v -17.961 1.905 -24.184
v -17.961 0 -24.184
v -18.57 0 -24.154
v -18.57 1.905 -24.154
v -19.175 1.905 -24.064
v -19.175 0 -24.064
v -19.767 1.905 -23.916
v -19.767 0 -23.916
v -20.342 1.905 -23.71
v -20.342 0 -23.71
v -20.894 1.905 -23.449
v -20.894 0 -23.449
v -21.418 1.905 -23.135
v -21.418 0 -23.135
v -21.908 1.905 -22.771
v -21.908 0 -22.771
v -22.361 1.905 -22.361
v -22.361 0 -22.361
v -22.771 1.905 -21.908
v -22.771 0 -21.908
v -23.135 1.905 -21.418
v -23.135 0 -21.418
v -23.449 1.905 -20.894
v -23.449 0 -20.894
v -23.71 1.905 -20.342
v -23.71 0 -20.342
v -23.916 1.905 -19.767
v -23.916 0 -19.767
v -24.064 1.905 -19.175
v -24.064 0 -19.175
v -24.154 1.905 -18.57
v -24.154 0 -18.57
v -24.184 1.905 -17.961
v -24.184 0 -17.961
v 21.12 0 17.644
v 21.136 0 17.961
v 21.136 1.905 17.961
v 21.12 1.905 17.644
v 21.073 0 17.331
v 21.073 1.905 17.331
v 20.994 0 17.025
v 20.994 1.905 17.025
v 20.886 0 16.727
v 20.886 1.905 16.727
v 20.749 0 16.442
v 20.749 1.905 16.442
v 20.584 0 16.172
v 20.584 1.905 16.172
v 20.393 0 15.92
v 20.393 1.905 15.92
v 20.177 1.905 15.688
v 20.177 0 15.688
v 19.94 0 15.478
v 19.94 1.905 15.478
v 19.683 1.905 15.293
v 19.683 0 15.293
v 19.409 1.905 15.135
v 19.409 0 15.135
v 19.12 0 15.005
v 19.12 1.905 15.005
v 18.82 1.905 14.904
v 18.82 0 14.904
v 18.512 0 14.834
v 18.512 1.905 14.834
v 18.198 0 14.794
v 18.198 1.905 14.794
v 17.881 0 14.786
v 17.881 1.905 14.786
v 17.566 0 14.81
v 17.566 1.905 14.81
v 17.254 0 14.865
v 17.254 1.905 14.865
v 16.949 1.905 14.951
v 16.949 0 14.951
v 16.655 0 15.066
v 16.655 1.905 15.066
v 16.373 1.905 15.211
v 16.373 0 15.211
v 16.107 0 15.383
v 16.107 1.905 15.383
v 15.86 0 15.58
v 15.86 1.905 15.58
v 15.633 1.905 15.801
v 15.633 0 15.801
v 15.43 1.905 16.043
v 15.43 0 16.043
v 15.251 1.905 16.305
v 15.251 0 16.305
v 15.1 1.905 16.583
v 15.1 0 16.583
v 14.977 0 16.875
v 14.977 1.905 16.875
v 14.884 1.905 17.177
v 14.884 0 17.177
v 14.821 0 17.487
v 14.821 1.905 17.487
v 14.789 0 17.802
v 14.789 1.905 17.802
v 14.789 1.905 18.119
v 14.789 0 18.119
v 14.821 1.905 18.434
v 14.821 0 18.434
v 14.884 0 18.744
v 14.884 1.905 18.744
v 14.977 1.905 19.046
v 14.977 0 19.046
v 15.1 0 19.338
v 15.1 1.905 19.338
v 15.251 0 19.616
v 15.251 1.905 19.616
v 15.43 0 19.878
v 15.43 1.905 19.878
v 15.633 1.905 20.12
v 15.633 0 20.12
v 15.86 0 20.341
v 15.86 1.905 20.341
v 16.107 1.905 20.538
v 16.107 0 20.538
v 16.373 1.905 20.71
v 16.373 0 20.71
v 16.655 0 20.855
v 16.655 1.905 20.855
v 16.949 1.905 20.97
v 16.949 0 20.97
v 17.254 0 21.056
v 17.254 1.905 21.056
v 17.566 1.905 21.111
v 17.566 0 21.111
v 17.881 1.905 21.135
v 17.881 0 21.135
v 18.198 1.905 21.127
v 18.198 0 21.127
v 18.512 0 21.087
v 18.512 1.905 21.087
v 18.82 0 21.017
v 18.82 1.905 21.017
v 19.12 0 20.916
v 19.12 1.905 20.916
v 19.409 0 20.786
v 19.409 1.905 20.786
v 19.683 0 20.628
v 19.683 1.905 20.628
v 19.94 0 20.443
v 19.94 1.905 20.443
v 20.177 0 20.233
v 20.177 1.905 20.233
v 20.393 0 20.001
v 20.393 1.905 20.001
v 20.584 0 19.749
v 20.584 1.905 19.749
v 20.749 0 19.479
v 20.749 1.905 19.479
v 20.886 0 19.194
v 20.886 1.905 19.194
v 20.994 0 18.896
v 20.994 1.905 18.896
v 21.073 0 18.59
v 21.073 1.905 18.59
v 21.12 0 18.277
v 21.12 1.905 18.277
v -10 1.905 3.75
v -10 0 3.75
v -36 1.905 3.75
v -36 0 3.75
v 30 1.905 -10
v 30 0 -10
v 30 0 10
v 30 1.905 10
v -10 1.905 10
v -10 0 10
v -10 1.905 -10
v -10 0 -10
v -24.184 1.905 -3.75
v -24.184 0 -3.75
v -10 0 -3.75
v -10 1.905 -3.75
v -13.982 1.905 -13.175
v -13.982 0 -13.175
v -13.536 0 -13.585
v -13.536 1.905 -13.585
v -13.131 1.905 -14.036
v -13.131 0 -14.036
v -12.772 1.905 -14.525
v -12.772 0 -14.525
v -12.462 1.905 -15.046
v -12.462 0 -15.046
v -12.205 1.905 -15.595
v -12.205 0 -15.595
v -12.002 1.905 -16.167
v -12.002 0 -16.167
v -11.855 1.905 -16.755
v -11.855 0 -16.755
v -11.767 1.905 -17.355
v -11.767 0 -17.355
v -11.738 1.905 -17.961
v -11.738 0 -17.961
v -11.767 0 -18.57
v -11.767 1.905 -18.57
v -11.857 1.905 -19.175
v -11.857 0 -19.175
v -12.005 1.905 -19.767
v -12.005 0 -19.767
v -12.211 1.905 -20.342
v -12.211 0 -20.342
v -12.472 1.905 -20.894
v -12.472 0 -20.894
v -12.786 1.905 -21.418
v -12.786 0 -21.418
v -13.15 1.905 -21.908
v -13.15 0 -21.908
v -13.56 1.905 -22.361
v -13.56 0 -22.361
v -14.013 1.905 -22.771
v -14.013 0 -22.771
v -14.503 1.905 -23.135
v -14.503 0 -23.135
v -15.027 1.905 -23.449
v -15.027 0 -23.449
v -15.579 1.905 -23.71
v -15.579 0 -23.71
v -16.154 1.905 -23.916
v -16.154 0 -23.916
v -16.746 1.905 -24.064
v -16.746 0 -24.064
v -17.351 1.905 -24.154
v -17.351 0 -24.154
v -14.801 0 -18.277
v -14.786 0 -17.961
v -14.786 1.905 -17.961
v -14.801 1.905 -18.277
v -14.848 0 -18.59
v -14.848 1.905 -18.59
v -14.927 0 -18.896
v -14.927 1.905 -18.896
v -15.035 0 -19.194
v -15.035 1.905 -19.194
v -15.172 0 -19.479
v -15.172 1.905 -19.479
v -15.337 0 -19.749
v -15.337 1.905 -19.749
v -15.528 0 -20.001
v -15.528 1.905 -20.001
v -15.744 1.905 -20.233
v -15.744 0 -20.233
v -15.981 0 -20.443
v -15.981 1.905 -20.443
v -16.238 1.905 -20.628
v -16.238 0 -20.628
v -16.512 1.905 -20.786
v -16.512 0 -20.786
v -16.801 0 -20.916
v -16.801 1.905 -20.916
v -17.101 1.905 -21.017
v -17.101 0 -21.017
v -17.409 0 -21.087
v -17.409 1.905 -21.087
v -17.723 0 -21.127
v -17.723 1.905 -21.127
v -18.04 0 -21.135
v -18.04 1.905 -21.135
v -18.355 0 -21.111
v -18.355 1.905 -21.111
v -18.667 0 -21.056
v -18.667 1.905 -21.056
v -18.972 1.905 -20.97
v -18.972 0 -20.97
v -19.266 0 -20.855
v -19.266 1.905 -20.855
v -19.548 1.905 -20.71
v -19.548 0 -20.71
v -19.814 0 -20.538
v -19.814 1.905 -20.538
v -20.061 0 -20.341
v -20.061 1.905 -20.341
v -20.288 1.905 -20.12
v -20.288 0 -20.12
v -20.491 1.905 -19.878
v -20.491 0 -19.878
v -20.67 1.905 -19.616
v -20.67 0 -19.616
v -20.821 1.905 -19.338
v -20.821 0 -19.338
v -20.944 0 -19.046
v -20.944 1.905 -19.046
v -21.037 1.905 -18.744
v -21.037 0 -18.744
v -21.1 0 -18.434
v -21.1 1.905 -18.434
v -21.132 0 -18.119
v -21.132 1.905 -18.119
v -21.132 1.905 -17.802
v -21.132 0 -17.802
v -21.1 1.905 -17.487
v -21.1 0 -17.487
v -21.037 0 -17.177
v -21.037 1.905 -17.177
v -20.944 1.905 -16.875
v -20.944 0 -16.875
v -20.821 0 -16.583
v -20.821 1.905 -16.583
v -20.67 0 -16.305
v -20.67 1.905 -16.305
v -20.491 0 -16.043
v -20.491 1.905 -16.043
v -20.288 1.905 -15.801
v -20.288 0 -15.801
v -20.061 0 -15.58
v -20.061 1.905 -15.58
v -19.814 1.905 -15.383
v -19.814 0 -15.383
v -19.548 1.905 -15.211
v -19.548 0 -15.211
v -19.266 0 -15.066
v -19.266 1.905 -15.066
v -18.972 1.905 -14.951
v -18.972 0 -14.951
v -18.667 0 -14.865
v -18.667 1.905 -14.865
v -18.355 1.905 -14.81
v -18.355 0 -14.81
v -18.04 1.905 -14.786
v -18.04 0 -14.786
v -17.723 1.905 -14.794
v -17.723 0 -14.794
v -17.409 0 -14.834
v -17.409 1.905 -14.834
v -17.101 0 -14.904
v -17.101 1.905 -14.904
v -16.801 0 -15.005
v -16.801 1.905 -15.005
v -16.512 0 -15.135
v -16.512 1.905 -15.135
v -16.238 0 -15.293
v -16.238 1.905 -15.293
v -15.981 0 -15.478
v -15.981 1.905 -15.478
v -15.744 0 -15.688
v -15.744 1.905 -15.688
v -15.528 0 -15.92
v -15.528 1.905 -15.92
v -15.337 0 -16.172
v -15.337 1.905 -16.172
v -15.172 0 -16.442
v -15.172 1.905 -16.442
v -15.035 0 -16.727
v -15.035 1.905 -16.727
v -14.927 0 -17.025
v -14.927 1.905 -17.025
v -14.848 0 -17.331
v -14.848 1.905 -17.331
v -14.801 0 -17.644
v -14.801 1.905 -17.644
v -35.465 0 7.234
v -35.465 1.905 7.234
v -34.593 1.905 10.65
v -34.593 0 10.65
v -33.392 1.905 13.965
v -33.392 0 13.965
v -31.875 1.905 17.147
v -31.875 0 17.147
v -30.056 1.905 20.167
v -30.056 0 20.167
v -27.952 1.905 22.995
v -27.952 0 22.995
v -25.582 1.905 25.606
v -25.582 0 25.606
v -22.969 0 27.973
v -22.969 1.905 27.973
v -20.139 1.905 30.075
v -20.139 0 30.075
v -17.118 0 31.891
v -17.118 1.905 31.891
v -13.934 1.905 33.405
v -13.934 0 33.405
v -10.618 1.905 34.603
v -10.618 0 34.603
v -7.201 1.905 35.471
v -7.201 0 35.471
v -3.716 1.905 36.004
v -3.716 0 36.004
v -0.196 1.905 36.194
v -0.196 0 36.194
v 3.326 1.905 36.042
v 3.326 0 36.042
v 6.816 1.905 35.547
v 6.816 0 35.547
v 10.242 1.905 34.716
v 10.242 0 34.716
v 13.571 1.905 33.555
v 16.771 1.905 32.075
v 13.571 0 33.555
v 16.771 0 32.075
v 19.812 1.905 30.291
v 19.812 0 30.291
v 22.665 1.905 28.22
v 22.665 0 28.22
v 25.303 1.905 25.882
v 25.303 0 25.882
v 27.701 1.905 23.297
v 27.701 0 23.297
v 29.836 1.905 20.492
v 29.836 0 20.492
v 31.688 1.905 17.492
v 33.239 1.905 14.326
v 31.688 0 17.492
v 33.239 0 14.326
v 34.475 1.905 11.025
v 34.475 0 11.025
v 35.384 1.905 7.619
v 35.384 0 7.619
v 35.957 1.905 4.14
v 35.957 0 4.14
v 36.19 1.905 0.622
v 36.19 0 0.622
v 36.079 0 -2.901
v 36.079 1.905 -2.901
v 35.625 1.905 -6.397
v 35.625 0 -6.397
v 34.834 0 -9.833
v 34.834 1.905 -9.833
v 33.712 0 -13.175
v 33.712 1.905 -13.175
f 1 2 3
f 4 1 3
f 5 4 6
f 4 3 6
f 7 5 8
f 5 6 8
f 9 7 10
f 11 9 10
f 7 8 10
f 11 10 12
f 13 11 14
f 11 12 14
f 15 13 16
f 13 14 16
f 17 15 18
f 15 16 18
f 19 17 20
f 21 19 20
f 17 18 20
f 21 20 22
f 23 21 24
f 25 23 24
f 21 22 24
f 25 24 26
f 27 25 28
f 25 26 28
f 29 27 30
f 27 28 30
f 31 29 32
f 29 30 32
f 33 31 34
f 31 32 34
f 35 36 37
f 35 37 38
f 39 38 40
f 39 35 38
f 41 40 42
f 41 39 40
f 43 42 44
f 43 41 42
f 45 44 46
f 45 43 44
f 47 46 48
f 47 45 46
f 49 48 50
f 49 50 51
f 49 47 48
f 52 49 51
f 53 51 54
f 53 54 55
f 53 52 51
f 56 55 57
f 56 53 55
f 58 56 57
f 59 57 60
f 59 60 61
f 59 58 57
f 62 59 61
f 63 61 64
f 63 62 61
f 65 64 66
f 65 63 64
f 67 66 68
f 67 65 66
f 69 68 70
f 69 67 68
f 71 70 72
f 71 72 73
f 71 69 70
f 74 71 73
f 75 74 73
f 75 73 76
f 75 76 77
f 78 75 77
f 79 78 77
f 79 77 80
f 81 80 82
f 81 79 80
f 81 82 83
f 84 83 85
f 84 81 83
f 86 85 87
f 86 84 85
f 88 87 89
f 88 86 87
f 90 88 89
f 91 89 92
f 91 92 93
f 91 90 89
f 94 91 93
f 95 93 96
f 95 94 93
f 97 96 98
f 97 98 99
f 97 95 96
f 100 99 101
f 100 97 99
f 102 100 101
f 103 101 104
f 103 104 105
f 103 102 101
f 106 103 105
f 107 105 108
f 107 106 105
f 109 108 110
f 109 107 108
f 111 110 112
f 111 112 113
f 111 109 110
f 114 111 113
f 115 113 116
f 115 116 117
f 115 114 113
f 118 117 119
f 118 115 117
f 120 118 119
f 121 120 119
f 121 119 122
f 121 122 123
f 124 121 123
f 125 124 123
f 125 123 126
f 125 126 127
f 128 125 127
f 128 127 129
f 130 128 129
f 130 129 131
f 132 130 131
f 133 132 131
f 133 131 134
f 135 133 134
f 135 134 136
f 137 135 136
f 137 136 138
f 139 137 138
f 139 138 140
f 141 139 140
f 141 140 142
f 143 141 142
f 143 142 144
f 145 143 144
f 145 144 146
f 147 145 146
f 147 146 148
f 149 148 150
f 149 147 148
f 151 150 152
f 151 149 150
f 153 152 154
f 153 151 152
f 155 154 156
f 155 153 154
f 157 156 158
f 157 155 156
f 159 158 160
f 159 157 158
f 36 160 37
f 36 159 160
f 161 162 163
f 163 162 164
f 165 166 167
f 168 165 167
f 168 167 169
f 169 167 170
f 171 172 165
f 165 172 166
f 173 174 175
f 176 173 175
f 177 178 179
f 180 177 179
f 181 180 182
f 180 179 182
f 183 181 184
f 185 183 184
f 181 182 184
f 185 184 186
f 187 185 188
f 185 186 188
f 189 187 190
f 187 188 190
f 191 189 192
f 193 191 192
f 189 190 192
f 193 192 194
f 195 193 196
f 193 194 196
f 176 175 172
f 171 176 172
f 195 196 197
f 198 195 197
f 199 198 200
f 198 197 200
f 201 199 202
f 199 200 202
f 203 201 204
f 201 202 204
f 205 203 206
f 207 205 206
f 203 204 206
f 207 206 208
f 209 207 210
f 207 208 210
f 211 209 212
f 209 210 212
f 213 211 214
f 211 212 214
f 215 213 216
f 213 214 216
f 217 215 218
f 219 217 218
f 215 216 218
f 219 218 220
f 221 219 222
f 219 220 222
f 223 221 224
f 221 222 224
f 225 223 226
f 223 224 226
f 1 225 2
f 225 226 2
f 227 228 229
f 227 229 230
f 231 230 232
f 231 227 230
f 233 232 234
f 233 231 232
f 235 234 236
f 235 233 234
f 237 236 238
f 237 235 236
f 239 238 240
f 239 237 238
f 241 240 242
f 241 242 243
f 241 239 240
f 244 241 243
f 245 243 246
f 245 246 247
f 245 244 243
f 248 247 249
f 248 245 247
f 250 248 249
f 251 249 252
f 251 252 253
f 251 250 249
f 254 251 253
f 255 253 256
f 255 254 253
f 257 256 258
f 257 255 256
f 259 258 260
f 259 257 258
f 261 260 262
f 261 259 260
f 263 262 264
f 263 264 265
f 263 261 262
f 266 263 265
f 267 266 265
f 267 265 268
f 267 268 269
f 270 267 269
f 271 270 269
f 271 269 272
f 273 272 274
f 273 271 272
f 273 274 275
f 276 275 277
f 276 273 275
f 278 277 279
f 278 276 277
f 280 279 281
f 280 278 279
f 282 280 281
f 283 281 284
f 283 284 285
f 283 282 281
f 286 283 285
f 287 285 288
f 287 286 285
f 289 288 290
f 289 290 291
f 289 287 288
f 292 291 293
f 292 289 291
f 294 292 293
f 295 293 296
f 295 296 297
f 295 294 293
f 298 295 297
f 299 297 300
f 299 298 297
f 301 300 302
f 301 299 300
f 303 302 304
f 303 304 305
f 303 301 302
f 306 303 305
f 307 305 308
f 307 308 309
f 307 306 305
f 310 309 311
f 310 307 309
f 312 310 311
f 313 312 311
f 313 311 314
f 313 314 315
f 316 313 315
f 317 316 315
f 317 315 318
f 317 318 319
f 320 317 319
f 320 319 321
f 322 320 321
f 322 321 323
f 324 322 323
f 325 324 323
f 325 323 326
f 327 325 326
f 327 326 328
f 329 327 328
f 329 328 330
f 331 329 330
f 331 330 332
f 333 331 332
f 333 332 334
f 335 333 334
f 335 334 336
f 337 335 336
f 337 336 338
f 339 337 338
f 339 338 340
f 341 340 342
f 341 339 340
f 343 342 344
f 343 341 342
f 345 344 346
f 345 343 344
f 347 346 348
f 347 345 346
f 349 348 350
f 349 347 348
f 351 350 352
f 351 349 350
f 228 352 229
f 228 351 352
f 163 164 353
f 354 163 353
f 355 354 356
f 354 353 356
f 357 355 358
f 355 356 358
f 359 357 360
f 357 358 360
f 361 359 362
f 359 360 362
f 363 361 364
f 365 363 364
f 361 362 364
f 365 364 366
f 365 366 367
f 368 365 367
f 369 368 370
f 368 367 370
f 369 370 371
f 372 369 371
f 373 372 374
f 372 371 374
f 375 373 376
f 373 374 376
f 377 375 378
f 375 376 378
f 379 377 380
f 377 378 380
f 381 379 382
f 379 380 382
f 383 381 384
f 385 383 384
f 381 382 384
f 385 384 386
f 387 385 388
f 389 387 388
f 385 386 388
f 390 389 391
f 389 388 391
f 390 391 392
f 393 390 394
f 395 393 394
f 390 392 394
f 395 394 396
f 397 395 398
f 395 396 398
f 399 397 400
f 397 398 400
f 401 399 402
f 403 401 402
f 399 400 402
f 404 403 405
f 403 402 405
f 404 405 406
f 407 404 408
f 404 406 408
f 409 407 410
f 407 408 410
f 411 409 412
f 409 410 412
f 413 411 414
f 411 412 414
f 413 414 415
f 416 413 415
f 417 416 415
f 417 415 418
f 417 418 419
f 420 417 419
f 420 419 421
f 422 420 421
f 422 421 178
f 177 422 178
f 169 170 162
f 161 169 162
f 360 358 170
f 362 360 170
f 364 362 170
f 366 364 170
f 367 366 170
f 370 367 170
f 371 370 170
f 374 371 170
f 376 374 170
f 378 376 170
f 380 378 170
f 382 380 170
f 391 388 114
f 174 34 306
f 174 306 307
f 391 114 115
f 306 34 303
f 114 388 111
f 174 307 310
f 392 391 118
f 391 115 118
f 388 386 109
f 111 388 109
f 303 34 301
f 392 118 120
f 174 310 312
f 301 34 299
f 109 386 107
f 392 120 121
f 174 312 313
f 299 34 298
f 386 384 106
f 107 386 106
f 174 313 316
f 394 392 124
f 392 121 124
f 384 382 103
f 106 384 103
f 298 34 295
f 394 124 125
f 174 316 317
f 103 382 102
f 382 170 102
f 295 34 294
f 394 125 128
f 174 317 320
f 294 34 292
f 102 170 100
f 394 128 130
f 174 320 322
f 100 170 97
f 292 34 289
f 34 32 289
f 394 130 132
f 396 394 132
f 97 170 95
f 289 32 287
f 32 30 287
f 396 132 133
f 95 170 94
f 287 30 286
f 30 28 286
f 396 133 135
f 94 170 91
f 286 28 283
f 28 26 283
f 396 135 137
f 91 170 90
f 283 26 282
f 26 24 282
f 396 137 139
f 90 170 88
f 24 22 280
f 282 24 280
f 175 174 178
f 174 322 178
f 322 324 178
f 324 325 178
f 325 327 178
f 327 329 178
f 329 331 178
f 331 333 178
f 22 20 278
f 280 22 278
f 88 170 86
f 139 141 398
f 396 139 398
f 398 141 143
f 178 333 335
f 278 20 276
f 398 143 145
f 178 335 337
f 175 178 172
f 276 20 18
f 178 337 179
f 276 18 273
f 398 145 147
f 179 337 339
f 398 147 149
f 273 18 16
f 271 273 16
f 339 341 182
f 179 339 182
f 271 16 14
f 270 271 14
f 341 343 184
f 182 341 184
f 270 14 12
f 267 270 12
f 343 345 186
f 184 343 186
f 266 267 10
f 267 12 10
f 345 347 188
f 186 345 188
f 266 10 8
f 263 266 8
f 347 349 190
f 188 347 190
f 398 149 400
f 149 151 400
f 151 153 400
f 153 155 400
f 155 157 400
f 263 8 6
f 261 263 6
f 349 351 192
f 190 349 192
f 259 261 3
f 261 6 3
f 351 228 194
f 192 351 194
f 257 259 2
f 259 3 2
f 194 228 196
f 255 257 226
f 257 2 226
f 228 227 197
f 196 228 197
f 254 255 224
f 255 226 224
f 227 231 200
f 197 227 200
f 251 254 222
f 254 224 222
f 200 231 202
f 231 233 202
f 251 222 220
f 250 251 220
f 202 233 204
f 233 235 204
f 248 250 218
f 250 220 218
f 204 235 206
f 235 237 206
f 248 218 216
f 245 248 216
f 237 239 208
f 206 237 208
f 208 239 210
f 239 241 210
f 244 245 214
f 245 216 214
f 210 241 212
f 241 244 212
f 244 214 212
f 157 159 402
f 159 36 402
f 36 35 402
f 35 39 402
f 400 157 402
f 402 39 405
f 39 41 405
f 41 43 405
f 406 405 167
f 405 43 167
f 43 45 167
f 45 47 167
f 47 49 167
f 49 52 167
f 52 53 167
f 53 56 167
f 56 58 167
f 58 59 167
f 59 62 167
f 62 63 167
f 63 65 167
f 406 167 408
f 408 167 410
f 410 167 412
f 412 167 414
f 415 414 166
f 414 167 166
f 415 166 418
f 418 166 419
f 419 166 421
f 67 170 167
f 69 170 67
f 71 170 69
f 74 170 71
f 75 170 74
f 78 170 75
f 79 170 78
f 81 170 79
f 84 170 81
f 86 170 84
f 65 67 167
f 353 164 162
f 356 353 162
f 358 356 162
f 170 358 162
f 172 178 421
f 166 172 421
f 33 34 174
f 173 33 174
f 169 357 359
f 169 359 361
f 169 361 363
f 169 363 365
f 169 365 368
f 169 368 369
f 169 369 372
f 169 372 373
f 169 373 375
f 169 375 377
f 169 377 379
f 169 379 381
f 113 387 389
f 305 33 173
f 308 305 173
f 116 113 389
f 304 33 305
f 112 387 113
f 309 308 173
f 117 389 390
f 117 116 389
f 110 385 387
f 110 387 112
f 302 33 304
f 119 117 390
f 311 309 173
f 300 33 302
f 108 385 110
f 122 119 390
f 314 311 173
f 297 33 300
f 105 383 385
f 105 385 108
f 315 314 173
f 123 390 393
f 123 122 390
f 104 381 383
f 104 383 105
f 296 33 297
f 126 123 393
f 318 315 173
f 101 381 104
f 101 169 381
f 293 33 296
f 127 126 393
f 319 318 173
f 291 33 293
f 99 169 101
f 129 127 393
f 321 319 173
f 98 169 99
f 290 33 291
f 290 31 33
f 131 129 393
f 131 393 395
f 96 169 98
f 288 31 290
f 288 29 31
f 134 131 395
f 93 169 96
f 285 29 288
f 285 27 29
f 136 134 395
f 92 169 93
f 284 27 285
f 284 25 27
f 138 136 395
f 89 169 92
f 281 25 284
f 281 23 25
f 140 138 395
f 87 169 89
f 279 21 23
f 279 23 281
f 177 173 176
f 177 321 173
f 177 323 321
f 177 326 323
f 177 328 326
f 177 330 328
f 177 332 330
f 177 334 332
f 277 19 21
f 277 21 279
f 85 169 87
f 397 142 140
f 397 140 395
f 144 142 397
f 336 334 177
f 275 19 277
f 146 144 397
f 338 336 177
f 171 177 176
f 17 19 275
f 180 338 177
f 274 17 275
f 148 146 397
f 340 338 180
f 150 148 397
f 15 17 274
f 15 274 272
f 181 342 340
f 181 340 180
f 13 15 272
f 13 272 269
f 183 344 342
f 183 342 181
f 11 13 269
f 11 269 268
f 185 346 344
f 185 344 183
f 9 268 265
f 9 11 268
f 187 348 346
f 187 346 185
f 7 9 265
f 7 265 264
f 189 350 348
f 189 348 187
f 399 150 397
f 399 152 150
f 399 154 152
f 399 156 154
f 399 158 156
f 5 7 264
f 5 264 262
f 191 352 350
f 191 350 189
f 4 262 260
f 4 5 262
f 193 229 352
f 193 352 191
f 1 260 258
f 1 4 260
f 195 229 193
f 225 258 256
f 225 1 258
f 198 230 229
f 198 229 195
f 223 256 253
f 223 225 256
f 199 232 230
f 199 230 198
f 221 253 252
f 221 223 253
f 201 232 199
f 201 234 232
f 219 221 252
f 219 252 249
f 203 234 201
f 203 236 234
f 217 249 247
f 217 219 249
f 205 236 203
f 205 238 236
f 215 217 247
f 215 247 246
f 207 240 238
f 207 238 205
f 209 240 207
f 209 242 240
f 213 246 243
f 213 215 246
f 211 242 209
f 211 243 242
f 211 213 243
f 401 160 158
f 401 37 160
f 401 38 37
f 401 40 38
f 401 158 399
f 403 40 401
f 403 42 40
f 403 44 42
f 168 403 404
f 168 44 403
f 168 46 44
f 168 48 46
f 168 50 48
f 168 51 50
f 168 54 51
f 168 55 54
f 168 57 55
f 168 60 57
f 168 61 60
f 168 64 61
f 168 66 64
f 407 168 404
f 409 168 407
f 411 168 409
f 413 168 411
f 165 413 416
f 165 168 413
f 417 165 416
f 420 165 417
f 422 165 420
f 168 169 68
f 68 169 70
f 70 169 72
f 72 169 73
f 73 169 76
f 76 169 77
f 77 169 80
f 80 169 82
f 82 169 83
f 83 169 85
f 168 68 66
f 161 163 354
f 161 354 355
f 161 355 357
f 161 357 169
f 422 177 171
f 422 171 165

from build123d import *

# Parameters (mm, degrees)
SKETCH2_R           = 3.175
BOSS_EXTRUDE1_DEPTH = 1.905


with BuildPart() as part:
    # Sketch2 → Boss-Extrude1 (new body)
    with BuildSketch(Plane(origin=(0, 0, 0), x_dir=(1, 0, 0), z_dir=(0, 1, 0))):
        with BuildLine():
            Line((-24.183512242, 17.960512242), (-24.183512242, 3.75))
            Line((-24.183512242, 3.75), (-10, 3.75))
            Line((-10, 3.75), (-10, 10))
            Line((-10, 10), (30, 10))
            Line((30, 10), (30, -10))
            Line((30, -10), (11.737512242, -10))
            Line((11.737512242, -10), (10, -10))
            Line((10, -10), (0, -10))
            Line((0, -10), (-10, -10))
            Line((-10, -10), (-10, -3.75))
            Line((-10, -3.75), (-24.183512242, -3.75))
            Line((-24.183512242, -3.75), (-36.000215624, -3.75))
            ThreePointArc((-36.000215624, -3.75), (8.539491503, -35.173215802), (33.7119771, 13.175))
            Line((33.7119771, 13.175), (-13.982497463, 13.175))
            ThreePointArc((-13.982497463, 13.175), (-12.326645232, 15.317545819), (-11.737512242, 17.960512242))
            ThreePointArc((-11.737512242, 17.960512242), (-13.560186743, 22.360837741), (-17.960512242, 24.183512242))
            ThreePointArc((-17.960512242, 24.183512242), (-22.360837741, 22.360837741), (-24.183512242, 17.960512242))
        make_face()
        with Locations((-17.960512242, 17.960512242)):
            Circle(SKETCH2_R, mode=Mode.SUBTRACT)
        with Locations((17.960512242, -17.960512242)):
            Circle(SKETCH2_R, mode=Mode.SUBTRACT)
    extrude(amount=BOSS_EXTRUDE1_DEPTH)


solid = part.part
